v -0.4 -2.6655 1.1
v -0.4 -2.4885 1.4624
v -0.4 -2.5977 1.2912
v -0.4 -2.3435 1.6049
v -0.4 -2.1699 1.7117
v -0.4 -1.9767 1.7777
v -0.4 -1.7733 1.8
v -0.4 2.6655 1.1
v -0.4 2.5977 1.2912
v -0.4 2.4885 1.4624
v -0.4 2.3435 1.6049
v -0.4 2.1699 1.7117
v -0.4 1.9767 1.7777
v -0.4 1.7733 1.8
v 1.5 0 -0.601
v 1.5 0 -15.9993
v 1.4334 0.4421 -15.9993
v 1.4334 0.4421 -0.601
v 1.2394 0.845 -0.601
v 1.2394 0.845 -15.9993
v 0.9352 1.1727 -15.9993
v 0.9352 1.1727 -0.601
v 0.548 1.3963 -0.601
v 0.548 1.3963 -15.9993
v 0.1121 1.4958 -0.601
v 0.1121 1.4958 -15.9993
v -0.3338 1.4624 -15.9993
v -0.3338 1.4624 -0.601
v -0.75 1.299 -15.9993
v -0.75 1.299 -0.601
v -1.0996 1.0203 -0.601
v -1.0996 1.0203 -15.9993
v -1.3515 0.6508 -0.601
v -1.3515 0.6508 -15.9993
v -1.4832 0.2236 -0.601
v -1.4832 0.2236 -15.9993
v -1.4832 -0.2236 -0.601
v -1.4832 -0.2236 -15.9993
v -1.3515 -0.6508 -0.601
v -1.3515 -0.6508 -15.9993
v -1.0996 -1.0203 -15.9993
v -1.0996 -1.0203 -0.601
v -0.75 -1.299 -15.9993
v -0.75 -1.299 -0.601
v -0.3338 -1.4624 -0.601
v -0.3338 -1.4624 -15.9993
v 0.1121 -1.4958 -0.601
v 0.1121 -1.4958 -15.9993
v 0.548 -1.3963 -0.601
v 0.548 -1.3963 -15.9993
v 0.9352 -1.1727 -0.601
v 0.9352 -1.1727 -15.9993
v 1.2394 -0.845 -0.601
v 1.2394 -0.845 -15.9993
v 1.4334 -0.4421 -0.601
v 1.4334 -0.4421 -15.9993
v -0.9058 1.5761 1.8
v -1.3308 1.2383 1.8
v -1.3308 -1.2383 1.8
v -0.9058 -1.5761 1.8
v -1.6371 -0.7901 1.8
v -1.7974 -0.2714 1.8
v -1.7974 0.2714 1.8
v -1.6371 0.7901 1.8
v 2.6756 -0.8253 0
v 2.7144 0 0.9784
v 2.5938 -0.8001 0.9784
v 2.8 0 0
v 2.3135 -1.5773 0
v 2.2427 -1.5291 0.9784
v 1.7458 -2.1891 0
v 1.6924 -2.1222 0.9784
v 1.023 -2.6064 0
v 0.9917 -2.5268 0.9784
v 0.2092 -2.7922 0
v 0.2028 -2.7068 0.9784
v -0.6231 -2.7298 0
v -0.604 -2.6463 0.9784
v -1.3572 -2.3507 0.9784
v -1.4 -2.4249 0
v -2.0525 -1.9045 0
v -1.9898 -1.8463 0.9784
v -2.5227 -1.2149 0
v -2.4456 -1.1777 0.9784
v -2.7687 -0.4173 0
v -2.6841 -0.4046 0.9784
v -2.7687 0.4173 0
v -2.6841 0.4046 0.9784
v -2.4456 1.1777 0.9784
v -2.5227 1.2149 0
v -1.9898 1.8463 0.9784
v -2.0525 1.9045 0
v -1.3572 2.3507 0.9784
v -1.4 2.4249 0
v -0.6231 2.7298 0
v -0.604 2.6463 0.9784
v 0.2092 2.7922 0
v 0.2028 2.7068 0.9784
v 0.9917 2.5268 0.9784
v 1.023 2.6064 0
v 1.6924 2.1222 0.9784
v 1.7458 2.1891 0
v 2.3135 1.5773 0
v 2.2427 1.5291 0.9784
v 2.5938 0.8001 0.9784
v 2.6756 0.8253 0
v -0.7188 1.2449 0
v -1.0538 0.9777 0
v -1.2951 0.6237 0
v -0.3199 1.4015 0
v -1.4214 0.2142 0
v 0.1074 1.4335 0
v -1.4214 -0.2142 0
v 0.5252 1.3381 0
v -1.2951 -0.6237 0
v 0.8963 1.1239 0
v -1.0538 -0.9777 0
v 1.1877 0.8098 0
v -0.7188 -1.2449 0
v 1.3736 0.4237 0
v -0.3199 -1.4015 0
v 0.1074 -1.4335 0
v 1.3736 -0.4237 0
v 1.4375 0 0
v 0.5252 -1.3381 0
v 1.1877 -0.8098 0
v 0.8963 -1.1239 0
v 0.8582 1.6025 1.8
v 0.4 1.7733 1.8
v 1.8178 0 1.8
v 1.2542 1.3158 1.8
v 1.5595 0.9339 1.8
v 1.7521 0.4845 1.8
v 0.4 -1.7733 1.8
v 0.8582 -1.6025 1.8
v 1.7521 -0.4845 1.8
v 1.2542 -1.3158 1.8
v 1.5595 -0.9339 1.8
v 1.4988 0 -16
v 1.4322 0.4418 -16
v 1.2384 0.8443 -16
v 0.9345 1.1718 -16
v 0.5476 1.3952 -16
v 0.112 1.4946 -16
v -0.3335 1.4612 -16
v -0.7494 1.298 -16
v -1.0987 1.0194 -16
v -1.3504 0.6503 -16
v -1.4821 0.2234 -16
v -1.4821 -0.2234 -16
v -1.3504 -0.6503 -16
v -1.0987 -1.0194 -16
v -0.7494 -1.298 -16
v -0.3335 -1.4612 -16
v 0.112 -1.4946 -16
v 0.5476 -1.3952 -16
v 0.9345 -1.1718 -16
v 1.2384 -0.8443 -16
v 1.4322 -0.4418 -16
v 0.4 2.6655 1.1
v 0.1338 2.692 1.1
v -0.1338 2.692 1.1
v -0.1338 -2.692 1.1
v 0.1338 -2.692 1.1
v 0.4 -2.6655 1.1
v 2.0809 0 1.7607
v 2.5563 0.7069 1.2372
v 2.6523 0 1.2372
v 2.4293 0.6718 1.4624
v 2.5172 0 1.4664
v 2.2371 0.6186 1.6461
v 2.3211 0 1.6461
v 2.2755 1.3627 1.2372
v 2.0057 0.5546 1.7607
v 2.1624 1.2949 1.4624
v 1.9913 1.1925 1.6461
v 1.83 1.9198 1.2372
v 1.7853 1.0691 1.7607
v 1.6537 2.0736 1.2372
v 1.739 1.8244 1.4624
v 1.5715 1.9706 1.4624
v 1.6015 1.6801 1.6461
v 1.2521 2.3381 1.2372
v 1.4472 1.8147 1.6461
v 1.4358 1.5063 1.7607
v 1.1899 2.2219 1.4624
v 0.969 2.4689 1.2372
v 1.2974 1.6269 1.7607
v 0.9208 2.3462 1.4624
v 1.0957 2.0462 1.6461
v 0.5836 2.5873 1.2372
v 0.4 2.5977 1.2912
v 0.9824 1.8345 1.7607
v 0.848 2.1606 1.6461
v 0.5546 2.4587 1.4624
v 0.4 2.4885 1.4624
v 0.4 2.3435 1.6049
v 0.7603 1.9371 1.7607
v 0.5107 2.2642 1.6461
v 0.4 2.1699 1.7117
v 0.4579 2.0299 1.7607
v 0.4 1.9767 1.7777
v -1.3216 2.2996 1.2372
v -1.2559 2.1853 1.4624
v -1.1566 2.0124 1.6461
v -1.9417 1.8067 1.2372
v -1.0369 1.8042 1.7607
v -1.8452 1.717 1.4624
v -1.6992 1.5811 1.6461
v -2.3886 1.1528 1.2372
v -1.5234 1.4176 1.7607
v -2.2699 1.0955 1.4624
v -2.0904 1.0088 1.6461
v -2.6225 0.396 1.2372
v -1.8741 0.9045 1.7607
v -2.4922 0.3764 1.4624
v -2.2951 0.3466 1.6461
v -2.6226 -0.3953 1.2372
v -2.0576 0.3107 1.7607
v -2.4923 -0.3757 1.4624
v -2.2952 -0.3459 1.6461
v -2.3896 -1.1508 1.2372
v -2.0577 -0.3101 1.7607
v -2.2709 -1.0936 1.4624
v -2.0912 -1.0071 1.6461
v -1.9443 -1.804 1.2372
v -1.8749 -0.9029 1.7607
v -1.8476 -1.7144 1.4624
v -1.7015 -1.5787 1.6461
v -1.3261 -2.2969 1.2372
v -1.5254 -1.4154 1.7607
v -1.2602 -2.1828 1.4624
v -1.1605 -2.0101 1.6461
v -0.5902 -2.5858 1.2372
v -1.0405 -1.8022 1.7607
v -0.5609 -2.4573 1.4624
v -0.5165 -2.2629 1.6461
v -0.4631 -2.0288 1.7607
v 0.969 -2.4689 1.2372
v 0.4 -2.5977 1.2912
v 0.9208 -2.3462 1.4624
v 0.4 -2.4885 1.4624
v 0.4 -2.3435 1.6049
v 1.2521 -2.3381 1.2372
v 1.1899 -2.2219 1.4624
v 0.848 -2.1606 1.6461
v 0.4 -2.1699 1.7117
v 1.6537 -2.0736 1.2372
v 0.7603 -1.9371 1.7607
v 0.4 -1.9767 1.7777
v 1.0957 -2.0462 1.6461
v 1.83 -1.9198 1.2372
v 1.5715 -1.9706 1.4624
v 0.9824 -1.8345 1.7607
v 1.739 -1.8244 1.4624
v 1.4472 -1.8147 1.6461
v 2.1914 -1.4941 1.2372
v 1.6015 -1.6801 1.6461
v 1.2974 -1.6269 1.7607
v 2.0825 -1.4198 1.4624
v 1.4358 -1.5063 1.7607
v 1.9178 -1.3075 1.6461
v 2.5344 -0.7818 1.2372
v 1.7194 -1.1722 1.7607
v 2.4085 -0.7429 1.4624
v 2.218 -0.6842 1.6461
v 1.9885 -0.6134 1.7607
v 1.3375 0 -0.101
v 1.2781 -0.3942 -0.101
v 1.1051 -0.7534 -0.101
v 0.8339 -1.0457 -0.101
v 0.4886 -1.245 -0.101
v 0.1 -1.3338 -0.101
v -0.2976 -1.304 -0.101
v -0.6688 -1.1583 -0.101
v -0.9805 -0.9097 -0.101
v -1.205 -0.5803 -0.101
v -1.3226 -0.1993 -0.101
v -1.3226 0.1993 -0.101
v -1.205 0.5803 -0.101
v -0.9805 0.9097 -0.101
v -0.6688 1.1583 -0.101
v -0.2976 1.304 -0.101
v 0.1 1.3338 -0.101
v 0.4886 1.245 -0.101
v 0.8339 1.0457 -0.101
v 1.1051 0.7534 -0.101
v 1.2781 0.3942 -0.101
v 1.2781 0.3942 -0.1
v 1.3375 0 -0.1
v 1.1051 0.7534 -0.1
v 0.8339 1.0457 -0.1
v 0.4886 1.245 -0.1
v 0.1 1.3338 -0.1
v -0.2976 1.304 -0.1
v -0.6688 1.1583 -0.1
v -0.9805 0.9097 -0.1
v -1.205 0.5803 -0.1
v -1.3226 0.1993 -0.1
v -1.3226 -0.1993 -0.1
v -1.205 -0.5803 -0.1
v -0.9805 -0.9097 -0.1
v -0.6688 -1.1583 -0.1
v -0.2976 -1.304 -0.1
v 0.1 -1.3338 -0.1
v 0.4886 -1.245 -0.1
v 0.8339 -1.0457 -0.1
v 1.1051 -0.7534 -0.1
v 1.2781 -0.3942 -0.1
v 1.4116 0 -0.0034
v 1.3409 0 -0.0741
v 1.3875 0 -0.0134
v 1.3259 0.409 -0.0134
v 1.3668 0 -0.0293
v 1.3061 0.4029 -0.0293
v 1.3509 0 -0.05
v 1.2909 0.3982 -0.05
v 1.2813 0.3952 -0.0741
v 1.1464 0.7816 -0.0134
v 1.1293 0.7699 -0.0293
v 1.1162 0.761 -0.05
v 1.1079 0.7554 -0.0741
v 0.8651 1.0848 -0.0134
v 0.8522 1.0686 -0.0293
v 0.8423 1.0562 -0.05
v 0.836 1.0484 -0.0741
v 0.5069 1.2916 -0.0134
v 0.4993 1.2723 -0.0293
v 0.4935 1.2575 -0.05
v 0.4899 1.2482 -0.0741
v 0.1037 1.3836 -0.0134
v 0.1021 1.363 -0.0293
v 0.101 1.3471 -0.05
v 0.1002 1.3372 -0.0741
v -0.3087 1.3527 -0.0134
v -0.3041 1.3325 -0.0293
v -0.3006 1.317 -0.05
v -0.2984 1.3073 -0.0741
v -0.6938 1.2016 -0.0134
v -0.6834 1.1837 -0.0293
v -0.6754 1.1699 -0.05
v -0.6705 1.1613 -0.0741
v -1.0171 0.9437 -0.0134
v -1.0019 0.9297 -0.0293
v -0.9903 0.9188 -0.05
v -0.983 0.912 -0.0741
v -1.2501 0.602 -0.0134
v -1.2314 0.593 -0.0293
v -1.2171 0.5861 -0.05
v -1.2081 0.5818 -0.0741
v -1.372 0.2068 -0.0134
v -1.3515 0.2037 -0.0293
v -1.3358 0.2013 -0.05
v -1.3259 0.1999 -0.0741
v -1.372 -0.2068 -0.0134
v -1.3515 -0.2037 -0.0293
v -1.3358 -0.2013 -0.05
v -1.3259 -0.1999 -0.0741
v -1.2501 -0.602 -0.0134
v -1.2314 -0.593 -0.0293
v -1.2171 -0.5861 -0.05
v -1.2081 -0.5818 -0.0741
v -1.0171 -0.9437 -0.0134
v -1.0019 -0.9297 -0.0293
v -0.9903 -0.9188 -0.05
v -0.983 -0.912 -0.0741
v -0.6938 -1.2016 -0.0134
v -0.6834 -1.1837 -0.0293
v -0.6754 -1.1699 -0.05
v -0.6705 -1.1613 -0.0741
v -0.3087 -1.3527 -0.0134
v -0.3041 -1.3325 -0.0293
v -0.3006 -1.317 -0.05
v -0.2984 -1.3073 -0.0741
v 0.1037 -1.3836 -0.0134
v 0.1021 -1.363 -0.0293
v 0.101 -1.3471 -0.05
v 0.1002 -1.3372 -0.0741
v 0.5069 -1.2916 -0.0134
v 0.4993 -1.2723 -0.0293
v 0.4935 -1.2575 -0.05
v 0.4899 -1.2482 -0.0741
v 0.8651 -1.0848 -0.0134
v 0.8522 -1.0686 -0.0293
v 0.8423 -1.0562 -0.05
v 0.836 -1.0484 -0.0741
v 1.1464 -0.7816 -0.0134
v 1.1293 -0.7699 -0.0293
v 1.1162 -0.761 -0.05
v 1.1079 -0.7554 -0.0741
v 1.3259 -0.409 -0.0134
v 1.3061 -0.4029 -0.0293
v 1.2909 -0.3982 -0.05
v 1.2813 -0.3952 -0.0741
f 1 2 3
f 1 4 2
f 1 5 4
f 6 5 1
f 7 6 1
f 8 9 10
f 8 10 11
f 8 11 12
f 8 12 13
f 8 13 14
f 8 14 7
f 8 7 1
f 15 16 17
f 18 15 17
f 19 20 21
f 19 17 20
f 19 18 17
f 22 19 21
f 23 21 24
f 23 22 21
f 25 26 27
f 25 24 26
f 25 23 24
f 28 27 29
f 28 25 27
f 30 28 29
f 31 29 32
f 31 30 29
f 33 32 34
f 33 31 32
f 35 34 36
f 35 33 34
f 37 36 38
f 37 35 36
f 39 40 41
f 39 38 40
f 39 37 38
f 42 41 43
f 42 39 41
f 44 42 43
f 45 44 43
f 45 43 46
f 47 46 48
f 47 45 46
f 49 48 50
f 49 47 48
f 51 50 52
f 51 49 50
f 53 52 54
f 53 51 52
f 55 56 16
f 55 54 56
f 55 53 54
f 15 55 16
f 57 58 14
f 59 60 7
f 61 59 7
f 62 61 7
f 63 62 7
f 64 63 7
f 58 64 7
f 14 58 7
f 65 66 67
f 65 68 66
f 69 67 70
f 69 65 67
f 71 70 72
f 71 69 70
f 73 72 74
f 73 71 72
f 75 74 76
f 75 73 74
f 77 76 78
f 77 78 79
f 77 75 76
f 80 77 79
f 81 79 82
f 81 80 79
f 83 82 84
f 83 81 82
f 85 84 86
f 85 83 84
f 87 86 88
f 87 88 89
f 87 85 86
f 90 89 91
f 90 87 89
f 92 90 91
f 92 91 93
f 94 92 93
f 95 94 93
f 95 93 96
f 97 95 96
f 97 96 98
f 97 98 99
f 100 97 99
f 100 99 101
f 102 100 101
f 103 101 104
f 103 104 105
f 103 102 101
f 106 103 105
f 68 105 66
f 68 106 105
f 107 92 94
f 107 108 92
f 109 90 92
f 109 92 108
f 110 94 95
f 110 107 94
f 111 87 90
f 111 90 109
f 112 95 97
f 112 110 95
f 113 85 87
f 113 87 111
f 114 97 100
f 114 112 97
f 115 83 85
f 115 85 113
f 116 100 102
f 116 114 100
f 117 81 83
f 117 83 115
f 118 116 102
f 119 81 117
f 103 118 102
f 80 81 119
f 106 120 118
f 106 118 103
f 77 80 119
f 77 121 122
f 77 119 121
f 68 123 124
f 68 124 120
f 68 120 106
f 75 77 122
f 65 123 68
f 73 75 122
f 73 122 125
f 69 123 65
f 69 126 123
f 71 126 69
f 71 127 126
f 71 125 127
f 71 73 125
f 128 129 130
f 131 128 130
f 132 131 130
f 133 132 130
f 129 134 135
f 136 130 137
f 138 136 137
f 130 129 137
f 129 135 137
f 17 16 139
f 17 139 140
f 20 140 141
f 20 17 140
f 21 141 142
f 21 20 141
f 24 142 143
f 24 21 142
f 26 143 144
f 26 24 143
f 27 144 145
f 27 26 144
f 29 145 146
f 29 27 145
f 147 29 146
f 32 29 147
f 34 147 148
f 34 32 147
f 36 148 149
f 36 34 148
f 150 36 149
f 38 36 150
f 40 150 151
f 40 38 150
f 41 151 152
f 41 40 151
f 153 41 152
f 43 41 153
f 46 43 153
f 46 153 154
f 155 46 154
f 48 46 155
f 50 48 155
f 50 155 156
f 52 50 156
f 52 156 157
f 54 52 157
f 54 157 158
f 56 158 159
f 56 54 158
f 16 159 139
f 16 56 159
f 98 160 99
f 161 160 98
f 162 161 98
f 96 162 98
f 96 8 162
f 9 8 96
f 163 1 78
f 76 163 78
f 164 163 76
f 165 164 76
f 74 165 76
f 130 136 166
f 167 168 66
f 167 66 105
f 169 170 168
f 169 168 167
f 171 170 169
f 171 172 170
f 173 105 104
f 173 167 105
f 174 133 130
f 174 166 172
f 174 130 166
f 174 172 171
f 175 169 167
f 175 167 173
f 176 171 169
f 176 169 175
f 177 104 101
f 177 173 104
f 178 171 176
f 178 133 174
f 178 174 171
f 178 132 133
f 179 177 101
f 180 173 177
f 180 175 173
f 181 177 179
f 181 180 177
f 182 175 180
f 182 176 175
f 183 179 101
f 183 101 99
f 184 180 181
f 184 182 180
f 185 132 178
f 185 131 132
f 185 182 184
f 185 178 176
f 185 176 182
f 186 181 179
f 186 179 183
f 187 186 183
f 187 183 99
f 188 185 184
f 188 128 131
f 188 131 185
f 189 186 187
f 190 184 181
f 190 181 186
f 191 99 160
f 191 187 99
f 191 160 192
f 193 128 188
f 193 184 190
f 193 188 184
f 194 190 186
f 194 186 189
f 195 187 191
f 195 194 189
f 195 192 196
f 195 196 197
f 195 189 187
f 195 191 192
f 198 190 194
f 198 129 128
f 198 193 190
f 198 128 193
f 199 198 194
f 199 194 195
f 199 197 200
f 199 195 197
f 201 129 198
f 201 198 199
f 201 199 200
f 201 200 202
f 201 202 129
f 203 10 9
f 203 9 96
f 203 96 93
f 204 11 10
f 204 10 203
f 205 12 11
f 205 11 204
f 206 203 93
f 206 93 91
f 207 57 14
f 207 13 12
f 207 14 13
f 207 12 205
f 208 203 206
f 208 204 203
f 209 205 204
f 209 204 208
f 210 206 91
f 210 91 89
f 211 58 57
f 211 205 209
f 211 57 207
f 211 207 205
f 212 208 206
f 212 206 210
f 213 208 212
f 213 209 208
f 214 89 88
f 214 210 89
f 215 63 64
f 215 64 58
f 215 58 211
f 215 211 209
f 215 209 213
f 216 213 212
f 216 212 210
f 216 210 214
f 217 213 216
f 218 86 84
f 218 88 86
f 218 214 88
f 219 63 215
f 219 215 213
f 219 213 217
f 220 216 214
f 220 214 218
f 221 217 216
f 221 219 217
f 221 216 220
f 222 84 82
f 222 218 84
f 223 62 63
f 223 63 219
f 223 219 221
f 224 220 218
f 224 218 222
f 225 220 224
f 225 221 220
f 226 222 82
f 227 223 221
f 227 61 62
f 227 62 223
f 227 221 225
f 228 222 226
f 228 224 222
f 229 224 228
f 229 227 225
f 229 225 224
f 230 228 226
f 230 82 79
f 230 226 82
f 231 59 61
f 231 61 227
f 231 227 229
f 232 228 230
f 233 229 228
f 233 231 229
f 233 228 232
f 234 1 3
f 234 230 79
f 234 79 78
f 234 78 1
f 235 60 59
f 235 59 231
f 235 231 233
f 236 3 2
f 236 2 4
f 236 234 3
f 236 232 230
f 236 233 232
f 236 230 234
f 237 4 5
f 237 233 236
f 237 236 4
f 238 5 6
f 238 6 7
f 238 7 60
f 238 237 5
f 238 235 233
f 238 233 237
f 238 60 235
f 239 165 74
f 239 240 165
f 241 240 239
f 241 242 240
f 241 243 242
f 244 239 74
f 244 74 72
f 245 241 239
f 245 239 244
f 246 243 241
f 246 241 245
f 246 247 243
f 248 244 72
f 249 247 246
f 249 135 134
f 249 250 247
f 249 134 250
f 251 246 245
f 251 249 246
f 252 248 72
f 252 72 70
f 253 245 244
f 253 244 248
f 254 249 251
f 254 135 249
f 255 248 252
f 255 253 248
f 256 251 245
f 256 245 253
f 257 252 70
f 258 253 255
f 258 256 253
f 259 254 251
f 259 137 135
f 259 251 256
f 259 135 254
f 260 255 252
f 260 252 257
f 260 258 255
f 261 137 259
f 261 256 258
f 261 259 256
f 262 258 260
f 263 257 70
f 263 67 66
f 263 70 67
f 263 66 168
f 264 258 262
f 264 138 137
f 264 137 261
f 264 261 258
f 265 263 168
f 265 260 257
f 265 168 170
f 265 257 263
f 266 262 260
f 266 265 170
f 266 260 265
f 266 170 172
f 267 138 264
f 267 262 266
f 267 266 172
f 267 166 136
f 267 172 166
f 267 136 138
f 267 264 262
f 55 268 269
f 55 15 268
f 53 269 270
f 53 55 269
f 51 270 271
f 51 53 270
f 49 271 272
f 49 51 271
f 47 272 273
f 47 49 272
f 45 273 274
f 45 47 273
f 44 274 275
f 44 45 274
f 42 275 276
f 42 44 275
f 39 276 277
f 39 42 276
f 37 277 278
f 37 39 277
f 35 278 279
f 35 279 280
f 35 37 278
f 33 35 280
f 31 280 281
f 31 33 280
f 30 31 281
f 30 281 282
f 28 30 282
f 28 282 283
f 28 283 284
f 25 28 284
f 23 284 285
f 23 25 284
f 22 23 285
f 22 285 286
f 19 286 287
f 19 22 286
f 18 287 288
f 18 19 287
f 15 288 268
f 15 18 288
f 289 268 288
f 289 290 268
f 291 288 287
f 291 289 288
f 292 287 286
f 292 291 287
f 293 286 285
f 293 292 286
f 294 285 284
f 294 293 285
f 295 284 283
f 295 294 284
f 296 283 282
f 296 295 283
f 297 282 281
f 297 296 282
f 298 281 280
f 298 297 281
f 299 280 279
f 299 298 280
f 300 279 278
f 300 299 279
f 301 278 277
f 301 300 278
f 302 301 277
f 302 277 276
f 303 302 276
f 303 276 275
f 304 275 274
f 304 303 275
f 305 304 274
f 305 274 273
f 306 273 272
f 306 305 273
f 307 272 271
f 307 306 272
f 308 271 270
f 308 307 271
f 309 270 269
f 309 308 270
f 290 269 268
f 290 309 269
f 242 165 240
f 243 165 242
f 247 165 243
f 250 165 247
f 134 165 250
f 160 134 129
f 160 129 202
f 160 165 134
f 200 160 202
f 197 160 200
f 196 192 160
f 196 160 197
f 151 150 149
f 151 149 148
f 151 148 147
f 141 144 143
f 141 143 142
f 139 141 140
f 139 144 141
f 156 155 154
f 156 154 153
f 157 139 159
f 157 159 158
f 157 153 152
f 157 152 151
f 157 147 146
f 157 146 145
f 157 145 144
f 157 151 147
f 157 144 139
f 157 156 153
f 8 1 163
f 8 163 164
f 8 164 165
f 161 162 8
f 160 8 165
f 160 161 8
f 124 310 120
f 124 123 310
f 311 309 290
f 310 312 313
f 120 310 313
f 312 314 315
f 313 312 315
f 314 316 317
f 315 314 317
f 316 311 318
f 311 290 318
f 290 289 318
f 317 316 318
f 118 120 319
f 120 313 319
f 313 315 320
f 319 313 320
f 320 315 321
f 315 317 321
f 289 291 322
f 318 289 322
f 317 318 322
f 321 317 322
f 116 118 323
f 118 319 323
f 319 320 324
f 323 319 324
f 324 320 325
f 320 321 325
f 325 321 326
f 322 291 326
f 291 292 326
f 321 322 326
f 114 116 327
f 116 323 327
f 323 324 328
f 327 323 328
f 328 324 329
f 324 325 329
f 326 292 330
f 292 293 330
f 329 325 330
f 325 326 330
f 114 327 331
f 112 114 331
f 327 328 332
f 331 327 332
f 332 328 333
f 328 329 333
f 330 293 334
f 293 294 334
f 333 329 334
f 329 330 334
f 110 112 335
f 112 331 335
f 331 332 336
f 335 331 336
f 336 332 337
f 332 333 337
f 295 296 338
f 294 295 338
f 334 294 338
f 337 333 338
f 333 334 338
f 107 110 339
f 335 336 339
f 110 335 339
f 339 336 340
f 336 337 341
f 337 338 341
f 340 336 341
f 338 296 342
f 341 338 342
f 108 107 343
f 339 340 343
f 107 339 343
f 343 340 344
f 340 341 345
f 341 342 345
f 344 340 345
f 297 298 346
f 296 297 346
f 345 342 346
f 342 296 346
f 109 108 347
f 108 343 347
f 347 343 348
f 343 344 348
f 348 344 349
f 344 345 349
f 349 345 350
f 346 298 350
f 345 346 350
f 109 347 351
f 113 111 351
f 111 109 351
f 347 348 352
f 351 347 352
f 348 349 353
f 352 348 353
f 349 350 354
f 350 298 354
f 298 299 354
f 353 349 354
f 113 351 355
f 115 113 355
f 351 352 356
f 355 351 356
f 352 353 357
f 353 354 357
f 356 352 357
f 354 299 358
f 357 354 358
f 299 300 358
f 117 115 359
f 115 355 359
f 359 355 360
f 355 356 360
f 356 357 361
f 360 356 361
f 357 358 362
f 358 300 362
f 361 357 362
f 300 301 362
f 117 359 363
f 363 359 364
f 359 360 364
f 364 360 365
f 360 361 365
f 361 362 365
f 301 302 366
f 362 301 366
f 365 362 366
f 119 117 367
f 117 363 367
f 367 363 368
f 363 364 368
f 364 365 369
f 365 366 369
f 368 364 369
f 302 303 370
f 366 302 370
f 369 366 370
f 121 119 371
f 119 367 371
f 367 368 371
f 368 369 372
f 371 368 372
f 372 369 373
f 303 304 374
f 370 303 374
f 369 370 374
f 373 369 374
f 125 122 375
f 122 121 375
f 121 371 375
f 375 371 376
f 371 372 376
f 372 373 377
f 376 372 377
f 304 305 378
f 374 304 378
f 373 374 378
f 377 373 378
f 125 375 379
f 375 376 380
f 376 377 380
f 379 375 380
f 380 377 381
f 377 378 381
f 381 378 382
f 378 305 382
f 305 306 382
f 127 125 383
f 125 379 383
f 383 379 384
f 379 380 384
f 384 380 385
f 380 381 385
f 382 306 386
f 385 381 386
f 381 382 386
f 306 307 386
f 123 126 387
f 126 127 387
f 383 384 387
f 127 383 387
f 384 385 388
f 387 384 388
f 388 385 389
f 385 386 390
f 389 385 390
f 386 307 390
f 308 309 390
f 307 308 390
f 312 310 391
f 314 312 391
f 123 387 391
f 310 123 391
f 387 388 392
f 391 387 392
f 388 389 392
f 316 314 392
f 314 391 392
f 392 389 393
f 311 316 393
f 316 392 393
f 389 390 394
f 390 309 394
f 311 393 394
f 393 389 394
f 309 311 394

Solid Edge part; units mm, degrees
sketch "Sketch1" plane through (0, 0, 0) normal (0, -1, 0) x (1, 0, 0)
  line L0 (0, -16) -> (1.5, -16)
  line L1 (1.5, -16) -> (1.5, -0.601)
  line L2 (1.5, -0.601) -> (1.3375, -0.101)
  line L3 (1.3375, -0.101) -> (1.3375, 0)
  line L4 (1.3375, 0) -> (2.8, 0)
  line L5 (2.8, 0) -> (2.6425, 1.8)
  line L6 (2.6425, 1.8) -> (0, 1.8)
  dimension "D1" = 1.5
  dimension "D2" = 1.3375
  dimension "D3" = 16
  dimension "D4" = 15.399
  dimension "D5" = 0.5
  dimension "D6" = 2.8
  dimension "D7" = 1.8
revolve "RevolvedProtrusion1" add sketch "Sketch1" angle 360 about axis through (0, 0, 6) along (0, 0, -1)
fillet "Round_1" radius 0.9 1 edges at (-2.6425, 0, 1.8)
sketch "Sketch2" plane through (0, 0, 0) normal (0, -1, 0) x (1, 0, 0)
  line L0 (-0.4, 1.8) -> (-0.4, 1.1)
  line L1 (-0.4, 1.1) -> (0.4, 1.1)
  line L2 (0.4, 1.1) -> (0.4, 1.8)
  line L3 (0.4, 1.8) -> (-0.4, 1.8)
  dimension "D1" = 0.8
  dimension "D2" = 0.7
  dimension "D3" = 1.8
extrude "ExtrudedCutout_1" cut sketch "Sketch2" along normal mid plane 5.6
cosmetic_thread "Thread_1" size "M3" thread depth 15.399
fillet "Round_2" radius 0.1 1 edges at (-1.3375, 0, 0)
chamfer "Chamfer_1" distance 0.0012 angle 30 1 edges at (-1.5, 0, -16) measured on face at (1.03, 0.97, -16)
properties material "Steel"
